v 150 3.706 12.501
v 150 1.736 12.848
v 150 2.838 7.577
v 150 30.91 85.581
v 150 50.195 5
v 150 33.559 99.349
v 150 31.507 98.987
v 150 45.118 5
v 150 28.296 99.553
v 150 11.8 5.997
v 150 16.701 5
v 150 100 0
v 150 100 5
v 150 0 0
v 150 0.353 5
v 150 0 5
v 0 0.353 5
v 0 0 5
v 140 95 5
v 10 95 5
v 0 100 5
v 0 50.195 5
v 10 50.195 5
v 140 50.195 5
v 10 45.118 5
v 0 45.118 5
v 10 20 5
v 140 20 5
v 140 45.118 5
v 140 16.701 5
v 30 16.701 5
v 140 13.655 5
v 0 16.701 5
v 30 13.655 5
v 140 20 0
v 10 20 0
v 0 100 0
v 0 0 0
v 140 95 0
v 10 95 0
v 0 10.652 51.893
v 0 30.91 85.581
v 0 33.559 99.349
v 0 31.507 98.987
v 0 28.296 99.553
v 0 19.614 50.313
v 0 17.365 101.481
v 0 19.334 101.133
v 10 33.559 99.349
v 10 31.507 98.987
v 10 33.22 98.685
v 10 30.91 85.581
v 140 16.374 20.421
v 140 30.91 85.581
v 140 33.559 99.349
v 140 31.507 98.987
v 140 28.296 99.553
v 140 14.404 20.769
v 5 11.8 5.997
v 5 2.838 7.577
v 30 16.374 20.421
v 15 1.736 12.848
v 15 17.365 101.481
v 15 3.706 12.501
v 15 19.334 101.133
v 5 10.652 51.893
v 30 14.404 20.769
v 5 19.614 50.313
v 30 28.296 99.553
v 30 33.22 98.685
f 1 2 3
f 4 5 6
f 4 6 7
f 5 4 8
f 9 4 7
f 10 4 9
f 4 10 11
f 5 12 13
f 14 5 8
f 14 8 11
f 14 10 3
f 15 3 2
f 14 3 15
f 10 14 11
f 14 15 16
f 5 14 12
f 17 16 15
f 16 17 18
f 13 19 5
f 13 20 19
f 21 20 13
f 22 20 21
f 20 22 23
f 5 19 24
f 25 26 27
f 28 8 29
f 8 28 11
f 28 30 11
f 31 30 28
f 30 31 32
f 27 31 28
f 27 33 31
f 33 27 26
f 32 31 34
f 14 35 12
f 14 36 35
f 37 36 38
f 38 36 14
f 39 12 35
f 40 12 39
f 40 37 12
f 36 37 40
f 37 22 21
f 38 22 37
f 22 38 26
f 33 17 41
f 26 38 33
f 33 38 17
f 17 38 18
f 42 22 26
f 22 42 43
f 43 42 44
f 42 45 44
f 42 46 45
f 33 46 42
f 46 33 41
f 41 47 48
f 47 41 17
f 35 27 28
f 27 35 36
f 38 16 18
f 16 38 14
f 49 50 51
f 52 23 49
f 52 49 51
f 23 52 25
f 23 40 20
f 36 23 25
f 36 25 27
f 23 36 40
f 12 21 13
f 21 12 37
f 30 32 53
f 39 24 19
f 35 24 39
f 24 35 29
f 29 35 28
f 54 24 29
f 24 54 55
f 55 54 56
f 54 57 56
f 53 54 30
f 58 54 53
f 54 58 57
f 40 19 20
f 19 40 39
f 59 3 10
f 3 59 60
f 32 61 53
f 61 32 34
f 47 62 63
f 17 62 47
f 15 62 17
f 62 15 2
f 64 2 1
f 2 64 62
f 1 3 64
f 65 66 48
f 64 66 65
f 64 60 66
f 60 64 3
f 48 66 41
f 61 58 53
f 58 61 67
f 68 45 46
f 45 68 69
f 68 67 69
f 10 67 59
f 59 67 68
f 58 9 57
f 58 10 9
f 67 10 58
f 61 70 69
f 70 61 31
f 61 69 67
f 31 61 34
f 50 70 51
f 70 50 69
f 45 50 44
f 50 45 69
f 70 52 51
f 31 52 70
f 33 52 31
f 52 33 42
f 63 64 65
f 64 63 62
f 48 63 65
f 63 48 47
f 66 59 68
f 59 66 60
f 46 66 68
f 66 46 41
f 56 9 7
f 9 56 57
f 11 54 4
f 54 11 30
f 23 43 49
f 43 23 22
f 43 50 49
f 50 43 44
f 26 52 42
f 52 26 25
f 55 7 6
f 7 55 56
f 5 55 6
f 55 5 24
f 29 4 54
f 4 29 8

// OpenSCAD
module base()
{
    cube([150,20,5]);
    cube([10,100,5]);
    translate([140, 0,0]) cube([10,100,5]);
    translate([0, 95,0]) cube([150,5,5]);
}

module holder()
{
    cube([150,13.1,5]);
    cube([150,2,10]);
    translate([0,11.1,0]) cube([150,2,20]);
    translate([0,11.1,0]) cube([30,5,100]);
    cube([15,2,100]);
    translate([0,2,0]) cube([5,9.1,50]);
    translate([140,11.1,0]) cube([10,5,100]);
}
base();
translate([0,0,3]) rotate([-10,0,0]) holder();
translate([0,46,0]) rotate([10,0,0]) cube([10,5,100]);
translate([140,46,0]) rotate([10,0,0]) cube([10,5,100]);
